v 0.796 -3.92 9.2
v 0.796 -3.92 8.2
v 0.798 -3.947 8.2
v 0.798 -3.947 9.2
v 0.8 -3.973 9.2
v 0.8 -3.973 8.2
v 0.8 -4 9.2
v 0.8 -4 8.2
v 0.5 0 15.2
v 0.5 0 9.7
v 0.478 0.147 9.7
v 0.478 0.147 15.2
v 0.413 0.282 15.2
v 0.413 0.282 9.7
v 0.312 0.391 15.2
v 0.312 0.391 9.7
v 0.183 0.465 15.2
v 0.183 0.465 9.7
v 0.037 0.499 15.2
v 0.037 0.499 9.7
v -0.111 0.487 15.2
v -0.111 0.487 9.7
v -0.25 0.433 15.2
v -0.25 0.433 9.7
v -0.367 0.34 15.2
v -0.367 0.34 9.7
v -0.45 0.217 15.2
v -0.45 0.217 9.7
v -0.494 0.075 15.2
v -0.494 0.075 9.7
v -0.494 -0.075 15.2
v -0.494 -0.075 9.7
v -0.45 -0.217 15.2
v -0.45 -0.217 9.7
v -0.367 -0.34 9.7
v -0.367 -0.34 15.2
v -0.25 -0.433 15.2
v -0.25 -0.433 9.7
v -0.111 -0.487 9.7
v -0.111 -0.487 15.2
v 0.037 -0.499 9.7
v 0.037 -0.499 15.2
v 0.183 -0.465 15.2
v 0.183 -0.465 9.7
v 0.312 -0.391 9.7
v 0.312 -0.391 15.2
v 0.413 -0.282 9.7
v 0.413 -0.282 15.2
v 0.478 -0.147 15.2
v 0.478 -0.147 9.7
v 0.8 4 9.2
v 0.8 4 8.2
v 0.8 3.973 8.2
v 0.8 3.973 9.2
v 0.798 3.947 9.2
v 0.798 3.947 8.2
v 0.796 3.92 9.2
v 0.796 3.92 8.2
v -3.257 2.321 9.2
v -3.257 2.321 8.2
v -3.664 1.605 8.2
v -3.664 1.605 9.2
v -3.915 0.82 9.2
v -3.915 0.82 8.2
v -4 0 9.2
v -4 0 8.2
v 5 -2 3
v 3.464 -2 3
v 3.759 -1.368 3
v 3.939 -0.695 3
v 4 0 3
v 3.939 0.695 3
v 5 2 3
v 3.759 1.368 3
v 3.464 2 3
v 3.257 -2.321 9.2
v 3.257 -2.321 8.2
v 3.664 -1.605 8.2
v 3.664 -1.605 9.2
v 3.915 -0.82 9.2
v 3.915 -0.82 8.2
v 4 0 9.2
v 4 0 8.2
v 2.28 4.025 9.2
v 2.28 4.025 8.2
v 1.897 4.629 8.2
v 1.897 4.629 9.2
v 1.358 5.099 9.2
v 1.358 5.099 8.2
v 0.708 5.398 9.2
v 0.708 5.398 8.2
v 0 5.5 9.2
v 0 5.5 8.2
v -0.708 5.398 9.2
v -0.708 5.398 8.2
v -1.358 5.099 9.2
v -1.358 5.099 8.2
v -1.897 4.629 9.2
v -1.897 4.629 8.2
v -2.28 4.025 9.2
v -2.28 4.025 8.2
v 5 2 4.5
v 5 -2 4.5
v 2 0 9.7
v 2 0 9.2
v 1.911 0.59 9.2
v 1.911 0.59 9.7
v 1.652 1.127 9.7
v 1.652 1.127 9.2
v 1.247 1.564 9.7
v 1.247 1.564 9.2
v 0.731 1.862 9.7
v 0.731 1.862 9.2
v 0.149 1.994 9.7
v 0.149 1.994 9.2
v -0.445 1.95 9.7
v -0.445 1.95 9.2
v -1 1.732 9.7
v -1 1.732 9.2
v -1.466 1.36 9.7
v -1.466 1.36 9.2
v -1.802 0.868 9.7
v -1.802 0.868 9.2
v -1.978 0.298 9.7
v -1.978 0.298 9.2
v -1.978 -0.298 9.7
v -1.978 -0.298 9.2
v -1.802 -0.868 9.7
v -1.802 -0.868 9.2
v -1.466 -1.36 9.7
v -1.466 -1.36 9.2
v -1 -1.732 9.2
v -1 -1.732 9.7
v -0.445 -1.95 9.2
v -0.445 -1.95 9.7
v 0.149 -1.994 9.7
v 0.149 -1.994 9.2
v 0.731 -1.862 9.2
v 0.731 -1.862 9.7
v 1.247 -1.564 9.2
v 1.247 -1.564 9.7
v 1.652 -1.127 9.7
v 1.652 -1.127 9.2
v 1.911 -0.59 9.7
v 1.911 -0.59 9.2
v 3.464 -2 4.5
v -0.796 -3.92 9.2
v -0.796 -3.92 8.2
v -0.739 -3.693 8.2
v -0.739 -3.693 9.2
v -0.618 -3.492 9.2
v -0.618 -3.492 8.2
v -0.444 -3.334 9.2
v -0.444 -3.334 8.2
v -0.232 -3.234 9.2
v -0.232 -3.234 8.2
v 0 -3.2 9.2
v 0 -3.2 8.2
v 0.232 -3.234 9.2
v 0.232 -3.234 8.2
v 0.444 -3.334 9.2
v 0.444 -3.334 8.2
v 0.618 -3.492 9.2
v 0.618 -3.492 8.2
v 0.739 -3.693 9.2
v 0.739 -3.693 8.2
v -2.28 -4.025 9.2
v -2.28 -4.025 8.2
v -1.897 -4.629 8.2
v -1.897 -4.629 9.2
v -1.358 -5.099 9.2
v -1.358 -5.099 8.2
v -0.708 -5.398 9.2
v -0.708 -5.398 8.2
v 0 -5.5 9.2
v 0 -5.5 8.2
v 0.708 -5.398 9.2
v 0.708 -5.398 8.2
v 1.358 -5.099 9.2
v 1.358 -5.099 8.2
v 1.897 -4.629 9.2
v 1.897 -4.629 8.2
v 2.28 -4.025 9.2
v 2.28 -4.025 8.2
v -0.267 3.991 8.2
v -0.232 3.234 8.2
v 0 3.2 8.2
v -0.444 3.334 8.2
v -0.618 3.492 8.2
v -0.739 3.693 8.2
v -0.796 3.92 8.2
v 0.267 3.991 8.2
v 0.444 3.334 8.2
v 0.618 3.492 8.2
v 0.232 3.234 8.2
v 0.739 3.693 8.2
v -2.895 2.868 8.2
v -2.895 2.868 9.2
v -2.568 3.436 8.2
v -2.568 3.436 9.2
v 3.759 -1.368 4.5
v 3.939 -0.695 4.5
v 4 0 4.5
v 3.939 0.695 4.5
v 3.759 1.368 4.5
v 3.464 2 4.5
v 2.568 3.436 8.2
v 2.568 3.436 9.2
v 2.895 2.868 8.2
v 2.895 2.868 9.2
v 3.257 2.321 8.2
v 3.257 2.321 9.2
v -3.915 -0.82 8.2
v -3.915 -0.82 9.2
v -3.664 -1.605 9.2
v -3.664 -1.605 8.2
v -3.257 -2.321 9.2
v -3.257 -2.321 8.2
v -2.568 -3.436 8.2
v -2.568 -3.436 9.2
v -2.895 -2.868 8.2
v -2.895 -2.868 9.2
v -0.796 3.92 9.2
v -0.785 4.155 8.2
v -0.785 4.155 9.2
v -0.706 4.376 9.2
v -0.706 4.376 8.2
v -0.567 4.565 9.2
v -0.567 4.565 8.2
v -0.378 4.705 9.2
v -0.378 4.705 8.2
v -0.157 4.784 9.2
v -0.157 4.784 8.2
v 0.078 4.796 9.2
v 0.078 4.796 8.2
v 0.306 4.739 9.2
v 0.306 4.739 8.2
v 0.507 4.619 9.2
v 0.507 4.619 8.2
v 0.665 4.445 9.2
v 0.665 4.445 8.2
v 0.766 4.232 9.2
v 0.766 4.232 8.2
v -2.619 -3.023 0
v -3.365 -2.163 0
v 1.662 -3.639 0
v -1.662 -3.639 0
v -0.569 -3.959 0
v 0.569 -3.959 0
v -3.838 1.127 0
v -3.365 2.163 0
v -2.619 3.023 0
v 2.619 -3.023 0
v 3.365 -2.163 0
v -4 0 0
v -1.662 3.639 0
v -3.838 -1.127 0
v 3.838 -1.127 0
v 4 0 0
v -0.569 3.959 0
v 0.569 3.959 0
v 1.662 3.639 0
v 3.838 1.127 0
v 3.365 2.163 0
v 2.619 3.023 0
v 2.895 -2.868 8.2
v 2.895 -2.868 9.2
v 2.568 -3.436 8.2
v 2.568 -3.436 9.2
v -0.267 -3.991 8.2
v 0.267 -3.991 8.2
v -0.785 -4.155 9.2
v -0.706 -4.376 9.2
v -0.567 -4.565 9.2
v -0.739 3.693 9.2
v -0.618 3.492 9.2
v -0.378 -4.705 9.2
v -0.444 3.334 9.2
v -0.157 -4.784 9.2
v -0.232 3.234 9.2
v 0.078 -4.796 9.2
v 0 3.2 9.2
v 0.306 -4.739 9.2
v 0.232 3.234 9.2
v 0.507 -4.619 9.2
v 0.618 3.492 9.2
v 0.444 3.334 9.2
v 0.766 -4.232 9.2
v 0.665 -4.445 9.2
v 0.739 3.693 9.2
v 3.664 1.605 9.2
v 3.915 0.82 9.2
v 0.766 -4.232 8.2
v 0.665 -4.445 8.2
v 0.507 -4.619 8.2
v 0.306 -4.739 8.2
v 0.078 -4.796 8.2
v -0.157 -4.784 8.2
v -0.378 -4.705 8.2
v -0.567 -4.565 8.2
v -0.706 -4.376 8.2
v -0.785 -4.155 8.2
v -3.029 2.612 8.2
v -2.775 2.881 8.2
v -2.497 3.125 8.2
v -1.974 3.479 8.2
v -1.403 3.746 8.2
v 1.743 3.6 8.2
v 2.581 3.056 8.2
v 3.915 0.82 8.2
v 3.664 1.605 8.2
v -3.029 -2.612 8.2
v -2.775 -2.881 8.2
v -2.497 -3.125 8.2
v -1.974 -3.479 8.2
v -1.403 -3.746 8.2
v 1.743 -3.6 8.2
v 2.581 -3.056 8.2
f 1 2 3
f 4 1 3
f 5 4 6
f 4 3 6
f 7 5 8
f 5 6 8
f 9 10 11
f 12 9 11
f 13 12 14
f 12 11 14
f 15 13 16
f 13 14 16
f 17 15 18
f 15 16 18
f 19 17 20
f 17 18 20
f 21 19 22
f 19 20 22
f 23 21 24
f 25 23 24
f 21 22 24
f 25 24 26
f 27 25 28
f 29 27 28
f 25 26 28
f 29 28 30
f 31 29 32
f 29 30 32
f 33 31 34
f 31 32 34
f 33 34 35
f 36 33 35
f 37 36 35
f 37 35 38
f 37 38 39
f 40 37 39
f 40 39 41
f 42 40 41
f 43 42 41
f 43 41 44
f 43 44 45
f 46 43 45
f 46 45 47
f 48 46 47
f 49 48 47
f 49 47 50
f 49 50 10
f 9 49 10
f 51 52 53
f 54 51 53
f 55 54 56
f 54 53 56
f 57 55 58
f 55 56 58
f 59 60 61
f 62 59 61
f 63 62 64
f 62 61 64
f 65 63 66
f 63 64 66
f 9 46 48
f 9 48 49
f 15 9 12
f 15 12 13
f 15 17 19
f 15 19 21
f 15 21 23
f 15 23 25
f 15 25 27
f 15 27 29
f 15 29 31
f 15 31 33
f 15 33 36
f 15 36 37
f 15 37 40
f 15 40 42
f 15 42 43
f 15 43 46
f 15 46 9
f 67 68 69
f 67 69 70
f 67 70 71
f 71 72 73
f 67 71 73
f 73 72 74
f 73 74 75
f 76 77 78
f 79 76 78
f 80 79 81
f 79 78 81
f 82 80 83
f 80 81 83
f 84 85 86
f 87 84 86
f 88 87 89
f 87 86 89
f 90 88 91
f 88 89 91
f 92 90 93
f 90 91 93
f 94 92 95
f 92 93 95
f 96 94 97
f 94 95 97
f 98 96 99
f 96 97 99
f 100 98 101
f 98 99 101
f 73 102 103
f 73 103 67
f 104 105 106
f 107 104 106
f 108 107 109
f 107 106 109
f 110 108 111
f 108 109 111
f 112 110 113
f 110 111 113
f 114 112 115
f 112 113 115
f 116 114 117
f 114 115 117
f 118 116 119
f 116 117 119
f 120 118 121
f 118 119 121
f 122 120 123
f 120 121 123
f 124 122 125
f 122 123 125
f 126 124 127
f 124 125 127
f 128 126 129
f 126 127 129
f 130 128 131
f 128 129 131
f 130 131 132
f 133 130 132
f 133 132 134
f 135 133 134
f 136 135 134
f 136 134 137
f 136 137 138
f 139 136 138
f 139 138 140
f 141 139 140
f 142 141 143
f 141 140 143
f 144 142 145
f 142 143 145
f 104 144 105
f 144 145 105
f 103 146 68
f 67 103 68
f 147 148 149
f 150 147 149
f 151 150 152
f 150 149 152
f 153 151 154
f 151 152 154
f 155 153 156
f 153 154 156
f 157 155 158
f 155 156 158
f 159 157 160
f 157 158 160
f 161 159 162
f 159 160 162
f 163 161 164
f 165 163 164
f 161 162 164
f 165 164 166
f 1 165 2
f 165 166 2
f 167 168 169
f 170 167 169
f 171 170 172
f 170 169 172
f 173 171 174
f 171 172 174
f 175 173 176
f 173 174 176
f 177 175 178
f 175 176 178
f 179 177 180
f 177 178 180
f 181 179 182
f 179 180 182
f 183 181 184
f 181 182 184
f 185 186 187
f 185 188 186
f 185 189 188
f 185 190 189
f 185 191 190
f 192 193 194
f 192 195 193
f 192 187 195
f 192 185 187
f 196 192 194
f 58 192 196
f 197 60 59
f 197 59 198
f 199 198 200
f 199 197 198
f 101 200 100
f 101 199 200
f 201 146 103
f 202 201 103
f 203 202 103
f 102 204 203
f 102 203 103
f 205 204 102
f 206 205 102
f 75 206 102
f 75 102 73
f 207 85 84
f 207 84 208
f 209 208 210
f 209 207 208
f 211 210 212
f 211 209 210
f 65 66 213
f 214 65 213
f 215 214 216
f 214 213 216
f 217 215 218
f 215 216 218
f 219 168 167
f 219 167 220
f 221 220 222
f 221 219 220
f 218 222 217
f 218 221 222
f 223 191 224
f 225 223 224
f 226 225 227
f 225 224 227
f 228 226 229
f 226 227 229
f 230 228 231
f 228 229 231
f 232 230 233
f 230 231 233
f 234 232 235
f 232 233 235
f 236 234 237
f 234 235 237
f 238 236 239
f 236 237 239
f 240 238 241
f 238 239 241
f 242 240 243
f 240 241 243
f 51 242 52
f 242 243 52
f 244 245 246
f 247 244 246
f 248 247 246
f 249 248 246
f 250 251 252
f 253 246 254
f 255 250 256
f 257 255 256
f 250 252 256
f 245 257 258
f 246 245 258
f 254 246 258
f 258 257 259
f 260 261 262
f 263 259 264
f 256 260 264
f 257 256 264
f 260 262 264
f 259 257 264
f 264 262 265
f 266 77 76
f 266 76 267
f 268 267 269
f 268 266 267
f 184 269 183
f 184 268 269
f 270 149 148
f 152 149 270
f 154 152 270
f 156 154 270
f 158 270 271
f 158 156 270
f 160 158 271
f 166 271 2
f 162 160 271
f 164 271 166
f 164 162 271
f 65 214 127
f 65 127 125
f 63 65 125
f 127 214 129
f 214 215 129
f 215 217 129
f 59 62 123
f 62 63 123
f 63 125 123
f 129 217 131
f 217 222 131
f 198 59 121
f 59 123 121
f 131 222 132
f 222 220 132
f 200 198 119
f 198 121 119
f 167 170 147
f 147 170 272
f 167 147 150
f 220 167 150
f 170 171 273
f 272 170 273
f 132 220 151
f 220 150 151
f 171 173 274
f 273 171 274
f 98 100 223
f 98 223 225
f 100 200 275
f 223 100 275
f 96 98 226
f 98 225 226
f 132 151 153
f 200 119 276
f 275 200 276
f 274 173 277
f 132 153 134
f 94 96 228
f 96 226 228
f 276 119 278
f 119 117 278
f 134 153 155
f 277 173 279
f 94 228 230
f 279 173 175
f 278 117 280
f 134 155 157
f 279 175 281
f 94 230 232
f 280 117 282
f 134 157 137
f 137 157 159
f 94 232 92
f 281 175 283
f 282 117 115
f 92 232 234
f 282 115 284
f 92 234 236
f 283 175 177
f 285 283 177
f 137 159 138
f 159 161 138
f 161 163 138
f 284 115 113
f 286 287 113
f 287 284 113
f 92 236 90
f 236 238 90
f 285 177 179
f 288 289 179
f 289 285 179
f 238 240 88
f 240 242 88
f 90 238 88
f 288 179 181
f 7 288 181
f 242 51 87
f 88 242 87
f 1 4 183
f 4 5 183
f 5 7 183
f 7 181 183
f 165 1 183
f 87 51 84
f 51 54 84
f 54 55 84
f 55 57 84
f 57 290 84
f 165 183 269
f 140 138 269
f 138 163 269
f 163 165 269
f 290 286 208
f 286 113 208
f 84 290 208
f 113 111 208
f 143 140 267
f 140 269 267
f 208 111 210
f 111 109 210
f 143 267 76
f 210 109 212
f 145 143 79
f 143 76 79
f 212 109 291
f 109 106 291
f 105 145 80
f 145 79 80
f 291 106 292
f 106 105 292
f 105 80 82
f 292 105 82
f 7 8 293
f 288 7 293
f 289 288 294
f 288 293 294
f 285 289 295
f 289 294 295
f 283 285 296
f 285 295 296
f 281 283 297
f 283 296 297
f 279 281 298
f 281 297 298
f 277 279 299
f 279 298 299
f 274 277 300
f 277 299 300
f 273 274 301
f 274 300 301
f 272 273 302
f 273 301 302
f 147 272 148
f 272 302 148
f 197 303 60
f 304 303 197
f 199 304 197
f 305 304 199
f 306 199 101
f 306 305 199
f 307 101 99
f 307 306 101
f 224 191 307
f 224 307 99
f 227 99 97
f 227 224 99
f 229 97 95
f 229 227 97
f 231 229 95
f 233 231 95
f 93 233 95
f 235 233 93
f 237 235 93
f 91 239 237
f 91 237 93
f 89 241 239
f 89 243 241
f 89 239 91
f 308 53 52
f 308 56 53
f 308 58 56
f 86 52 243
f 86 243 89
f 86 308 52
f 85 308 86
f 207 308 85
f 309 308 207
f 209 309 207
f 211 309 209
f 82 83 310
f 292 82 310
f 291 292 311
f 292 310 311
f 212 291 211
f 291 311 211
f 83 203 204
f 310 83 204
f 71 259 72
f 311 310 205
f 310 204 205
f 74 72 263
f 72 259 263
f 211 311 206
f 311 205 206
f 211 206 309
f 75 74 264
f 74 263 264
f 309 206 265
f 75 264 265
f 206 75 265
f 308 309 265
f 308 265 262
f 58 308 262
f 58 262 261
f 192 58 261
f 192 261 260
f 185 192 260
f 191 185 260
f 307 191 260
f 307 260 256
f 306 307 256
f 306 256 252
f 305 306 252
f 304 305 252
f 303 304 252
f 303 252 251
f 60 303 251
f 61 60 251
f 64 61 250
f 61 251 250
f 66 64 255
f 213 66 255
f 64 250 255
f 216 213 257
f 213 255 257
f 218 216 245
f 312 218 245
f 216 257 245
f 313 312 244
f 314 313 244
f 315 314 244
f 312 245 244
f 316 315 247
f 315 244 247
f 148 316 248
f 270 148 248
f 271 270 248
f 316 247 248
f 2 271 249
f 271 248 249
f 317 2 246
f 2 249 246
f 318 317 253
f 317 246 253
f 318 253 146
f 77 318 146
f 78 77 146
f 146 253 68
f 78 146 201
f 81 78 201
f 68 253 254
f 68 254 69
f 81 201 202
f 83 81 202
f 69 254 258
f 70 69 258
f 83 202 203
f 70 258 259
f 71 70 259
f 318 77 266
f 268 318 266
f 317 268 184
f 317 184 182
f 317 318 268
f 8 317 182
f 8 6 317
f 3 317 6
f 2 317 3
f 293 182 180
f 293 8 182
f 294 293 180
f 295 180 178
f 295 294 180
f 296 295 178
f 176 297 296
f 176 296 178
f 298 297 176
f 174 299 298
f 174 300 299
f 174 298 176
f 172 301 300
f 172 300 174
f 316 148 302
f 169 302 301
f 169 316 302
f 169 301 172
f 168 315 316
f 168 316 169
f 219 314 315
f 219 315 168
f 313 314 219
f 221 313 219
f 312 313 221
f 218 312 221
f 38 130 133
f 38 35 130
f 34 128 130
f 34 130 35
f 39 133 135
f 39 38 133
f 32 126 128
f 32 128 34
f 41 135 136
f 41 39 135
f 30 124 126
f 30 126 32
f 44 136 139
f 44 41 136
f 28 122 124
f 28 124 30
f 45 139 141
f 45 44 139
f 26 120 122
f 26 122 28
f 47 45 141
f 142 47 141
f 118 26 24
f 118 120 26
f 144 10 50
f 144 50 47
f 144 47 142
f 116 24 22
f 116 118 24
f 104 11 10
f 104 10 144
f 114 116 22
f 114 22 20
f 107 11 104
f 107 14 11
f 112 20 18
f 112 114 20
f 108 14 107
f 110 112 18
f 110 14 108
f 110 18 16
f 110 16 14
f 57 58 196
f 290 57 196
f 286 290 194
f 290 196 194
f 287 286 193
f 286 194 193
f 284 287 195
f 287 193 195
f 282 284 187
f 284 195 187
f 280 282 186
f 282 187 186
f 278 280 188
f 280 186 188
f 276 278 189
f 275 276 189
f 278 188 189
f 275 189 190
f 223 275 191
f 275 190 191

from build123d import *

# Parameters (mm, degrees)
SKETCH_2_R      = 4
EXTRUDE_1_DEPTH = 8.2
SKETCH_4_R      = 0.5
EXTRUDE_2_DEPTH = 7
SKETCH_5_R      = 1.5
EXTRUDE_3_DEPTH = 1
SKETCH_6_W      = 1.5
SKETCH_6_H      = 4
EXTRUDE_4_DEPTH = 5
EXTRUDE_5_DEPTH = 1
FILLET_1_R      = 10
SKETCH_8_R      = 2
EXTRUDE_6_DEPTH = 0.5


with BuildPart() as part:
    # 草图2 → 凸台-拉伸1 (new body)
    with BuildSketch(Plane.XY):
        Circle(SKETCH_2_R)
    extrude(amount=EXTRUDE_1_DEPTH)

    # 草图4 → 凸台-拉伸2 (add)
    with BuildSketch(Plane.XY.offset(8.2)):
        Circle(SKETCH_4_R)
    extrude(amount=EXTRUDE_2_DEPTH)

    # 草图5 → 凸台-拉伸3 (add)
    with BuildSketch(Plane.XY.offset(8.2)):
        Circle(SKETCH_5_R)
    extrude(amount=EXTRUDE_3_DEPTH)

    # 草图6 → 凸台-拉伸4 (add)
    with BuildSketch(Plane(origin=(0, 0, 0), x_dir=(0, 0, -1), z_dir=(1, 0, 0))):
        with Locations((-3.75, 0)):
            Rectangle(SKETCH_6_W, SKETCH_6_H)
    extrude(amount=EXTRUDE_4_DEPTH)

    # 草图7 → 凸台-拉伸5 (add)
    with BuildSketch(Plane.XY.offset(8.2)):
        with BuildLine():
            Line((4, 0), (1.5, 0))
            ThreePointArc((1.5, 0), (0, -1.5), (-1.5, 0))
            Line((-1.5, 0), (-4, 0))
            ThreePointArc((-4, 0), (-3.60468391, -1.733855216), (-2.496873044, -3.125))
            ThreePointArc((-2.496873044, -3.125), (-1.69373638, -3.623707642), (-0.79598995, -3.92))
            ThreePointArc((-0.79598995, -3.92), (0, -3.2), (0.79598995, -3.92))
            ThreePointArc((0.79598995, -3.92), (1.69373638, -3.623707642), (2.496873044, -3.125))
            ThreePointArc((2.496873044, -3.125), (3.60468391, -1.733855216), (4, 0))
        make_face()
        with BuildLine():
            ThreePointArc((-2.496873044, -3.125), (0, -5.5), (2.496873044, -3.125))
            ThreePointArc((2.496873044, -3.125), (1.69373638, -3.623707642), (0.79598995, -3.92))
            ThreePointArc((0.79598995, -3.92), (0.798996858, -3.95994978), (0.8, -4))
            ThreePointArc((0.8, -4), (-0.04005022, -4.798996858), (-0.79598995, -3.92))
            ThreePointArc((-0.79598995, -3.92), (-1.69373638, -3.623707642), (-2.496873044, -3.125))
        make_face()
        with BuildLine():
            ThreePointArc((-1.5, 0), (0, 1.5), (1.5, 0))
            Line((1.5, 0), (4, 0))
            ThreePointArc((4, 0), (3.60468391, 1.733855216), (2.496873044, 3.125))
            ThreePointArc((2.496873044, 3.125), (1.69373638, 3.623707642), (0.79598995, 3.92))
            ThreePointArc((0.79598995, 3.92), (0, 3.2), (-0.79598995, 3.92))
            ThreePointArc((-0.79598995, 3.92), (-1.69373638, 3.623707642), (-2.496873044, 3.125))
            ThreePointArc((-2.496873044, 3.125), (-3.60468391, 1.733855216), (-4, 0))
            Line((-4, 0), (-1.5, 0))
        make_face()
        with BuildLine():
            ThreePointArc((0.79598995, 3.92), (1.69373638, 3.623707642), (2.496873044, 3.125))
            ThreePointArc((2.496873044, 3.125), (0, 5.5), (-2.496873044, 3.125))
            ThreePointArc((-2.496873044, 3.125), (-1.69373638, 3.623707642), (-0.79598995, 3.92))
            ThreePointArc((-0.79598995, 3.92), (-0.04005022, 4.798996858), (0.8, 4))
            ThreePointArc((0.8, 4), (0.798996858, 3.95994978), (0.79598995, 3.92))
        make_face()
    extrude(amount=EXTRUDE_5_DEPTH)

    # 圆角1
    # the kernel refuses this fillet: 10 mm, written as the material it adds along each edge
    with BuildSketch(Plane(origin=(2.496873044, 3.125, 8.2), x_dir=(0.6874097542343248, -0.7262698050886497, 0), z_dir=(0, 0, 1)), Plane(origin=(-2.496873044, -3.125, 8.2), x_dir=(-0.6874097542343238, 0.7262698050886505, 0), z_dir=(0, 0, 1))) as fillet_1_piece_1:
        with BuildLine():
            CenterArc((2.489482148, 9.903897453), FILLET_1_R, 250.779418195, 11.270831285)
            ThreePointArc((-0.802576499, 0.461315716), (-0.379749812, 0.26812947), (0, 0))
            ThreePointArc((0, 0), (0.553218255, 0.038441019), (1.10643651, 0))
        make_face()
    extrude(amount=1)
    with BuildSketch(Plane(origin=(-2.496873044, 3.125, 8.2), x_dir=(-0.6874097542343243, -0.7262698050886502, 0), z_dir=(0, 0, 1)), Plane(origin=(2.496873044, -3.125, 8.2), x_dir=(0.6874097542343256, 0.7262698050886488, 0), z_dir=(0, 0, 1))) as fillet_1_piece_2:
        with BuildLine():
            CenterArc((2.489482148, -9.903897453), FILLET_1_R, 97.94975052, 11.270831285)
            ThreePointArc((-0.802576499, -0.461315716), (-0.379749812, -0.26812947), (0, 0))
            ThreePointArc((0, 0), (0.553218255, -0.038441019), (1.10643651, 0))
        make_face()
    extrude(amount=1)

    # 草图8 → 凸台-拉伸6 (add)
    with BuildSketch(Plane.XY.offset(9.2)):
        Circle(SKETCH_8_R)
    extrude(amount=EXTRUDE_6_DEPTH)


solid = part.part
